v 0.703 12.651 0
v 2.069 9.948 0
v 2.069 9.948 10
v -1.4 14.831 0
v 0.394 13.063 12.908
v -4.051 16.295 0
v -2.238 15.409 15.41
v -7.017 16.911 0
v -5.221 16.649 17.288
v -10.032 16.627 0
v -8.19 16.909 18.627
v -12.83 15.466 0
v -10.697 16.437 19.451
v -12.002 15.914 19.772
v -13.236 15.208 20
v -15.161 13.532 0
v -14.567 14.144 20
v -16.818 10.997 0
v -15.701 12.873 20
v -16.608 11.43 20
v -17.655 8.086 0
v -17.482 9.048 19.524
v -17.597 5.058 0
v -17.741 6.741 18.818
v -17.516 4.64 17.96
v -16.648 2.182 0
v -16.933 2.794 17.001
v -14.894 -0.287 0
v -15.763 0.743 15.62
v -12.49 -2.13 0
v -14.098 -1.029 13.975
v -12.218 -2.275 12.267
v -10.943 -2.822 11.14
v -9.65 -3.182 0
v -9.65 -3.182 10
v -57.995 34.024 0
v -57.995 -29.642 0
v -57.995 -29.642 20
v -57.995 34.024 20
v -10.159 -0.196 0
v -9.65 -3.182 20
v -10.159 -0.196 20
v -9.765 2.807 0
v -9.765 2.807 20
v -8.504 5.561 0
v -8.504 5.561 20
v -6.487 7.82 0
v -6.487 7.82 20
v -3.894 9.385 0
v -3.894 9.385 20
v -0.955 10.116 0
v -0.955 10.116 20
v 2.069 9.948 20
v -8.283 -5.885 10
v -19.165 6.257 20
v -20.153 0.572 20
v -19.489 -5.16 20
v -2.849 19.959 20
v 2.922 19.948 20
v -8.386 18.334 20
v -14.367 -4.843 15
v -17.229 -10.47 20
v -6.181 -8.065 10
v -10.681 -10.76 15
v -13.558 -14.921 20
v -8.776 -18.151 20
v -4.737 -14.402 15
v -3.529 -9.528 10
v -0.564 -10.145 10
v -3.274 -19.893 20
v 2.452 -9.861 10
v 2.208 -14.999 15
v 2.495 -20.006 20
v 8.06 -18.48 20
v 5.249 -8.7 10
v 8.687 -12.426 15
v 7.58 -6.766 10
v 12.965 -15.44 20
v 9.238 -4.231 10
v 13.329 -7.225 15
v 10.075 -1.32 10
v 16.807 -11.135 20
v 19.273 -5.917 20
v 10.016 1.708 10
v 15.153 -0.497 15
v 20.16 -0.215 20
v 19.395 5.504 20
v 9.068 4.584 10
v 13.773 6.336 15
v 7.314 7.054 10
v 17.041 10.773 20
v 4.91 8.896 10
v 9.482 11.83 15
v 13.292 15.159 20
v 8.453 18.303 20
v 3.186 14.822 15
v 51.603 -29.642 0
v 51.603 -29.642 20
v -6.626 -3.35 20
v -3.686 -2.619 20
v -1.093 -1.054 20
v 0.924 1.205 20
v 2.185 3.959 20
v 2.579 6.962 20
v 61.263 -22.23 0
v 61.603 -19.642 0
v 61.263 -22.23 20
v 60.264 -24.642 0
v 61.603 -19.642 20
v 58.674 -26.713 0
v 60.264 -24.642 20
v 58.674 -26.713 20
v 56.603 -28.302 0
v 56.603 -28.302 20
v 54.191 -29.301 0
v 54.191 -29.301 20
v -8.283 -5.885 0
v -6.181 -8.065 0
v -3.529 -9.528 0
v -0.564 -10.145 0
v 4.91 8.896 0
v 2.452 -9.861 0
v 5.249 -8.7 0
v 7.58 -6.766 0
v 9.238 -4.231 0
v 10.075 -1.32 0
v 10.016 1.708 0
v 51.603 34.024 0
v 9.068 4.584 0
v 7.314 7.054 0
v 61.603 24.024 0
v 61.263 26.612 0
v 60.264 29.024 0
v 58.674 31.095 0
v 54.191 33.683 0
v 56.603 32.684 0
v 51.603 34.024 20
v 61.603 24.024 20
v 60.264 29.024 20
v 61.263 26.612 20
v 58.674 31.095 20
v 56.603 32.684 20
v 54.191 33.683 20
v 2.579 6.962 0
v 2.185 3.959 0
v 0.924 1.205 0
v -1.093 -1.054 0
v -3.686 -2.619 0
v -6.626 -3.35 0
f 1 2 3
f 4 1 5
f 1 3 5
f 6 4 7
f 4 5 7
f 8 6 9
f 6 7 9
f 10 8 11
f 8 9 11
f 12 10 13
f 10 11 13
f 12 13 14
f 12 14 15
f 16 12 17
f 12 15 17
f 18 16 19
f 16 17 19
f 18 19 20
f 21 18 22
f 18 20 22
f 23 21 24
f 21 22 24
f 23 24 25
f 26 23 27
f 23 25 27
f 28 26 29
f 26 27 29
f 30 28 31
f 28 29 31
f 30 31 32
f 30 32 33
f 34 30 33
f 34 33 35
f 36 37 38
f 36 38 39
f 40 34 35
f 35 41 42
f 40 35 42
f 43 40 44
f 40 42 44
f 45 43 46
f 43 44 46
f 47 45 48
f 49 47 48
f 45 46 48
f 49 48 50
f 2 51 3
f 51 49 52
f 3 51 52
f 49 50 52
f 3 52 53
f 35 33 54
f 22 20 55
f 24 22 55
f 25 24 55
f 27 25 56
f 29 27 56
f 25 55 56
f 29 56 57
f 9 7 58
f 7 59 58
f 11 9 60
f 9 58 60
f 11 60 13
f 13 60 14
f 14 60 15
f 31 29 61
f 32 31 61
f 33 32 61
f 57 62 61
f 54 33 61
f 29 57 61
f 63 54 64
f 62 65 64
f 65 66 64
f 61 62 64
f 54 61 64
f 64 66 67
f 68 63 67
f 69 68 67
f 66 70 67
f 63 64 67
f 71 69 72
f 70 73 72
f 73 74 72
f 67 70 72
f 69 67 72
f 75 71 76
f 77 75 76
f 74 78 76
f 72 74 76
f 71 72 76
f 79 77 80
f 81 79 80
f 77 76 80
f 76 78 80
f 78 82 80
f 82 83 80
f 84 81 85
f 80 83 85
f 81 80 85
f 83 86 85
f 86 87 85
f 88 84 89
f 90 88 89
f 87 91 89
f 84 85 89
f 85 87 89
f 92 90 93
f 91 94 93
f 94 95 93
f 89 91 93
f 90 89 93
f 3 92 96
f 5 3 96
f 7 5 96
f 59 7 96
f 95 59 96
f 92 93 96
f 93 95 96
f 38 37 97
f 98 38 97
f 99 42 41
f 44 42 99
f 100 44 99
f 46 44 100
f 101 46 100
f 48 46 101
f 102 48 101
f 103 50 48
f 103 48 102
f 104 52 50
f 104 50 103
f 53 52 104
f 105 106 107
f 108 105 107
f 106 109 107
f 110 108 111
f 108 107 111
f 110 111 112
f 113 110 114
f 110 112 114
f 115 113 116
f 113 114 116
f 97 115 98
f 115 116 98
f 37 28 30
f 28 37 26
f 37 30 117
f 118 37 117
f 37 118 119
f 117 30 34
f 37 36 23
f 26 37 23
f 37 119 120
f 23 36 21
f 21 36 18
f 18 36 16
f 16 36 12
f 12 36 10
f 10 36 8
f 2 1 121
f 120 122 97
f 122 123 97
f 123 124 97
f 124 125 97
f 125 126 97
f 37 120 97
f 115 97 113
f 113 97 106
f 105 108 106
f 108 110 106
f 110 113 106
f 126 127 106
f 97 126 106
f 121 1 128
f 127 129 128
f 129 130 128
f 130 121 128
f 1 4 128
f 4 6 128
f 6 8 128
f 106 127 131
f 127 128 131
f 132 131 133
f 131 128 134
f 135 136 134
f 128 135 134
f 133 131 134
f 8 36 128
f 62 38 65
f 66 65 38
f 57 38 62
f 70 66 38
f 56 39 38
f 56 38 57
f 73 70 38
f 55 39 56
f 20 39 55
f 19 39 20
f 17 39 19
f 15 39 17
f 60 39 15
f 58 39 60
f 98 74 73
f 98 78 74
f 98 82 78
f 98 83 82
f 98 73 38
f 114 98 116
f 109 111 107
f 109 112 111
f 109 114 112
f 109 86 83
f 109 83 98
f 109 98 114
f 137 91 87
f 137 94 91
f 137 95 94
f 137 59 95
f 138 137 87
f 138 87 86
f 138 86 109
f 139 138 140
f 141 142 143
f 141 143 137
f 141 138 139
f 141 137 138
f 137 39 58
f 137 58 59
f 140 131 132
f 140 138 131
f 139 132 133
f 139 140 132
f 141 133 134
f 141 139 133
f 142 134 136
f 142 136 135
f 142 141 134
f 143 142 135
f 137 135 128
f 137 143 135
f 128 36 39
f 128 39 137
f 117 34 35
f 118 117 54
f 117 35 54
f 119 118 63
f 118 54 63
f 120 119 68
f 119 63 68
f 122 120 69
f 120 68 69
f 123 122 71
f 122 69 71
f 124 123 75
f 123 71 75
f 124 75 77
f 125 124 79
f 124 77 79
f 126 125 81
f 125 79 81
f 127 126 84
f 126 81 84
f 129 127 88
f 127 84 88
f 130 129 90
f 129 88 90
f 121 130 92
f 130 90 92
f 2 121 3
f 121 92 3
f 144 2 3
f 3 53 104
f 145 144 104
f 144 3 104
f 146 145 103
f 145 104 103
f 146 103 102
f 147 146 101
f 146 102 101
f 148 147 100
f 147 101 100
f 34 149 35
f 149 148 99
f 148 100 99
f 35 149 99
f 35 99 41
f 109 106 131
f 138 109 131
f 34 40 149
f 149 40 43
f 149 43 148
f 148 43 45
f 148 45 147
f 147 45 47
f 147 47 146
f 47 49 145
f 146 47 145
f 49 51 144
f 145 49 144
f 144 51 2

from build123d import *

# Parameters (mm, degrees)
SKETCH1_W           = 119.597938106
SKETCH1_H           = 63.665281708
BOSS_EXTRUDE1_DEPTH = 20
FILLET1_R           = 10
FILLET2_R           = 10
CUT_EXTRUDE1_DEPTH  = 20
CHAMFER1_SIZE       = 10


with BuildPart() as part:
    # Sketch1 → Boss-Extrude1 (new body)
    with BuildSketch(Plane.XY):
        with Locations((1.804279239, 2.190910504)):
            Rectangle(SKETCH1_W, SKETCH1_H)
    extrude(amount=BOSS_EXTRUDE1_DEPTH)

    # Fillet1
    fillet1_edges = [part.edges().sort_by_distance(p)[0] for p in [
        (61.603248292, 34.023551358, 10),
    ]]
    fillet(fillet1_edges, radius=FILLET1_R)

    # Fillet2
    fillet2_edges = [part.edges().sort_by_distance(p)[0] for p in [
        (61.603248292, -29.64173035, 10),
    ]]
    fillet(fillet2_edges, radius=FILLET2_R)

    # Sketch2 → Cut-Extrude1 (cut)
    with BuildSketch(Plane.XY.offset(20)):
        with BuildLine():
            ThreePointArc((-9.649869077, -3.18172058), (7.580385389, -6.766171474), (2.069483688, 9.947892054))
            ThreePointArc((2.069483688, 9.947892054), (0, 0), (-9.649869077, -3.18172058))
        make_face()
        with BuildLine():
            ThreePointArc((-9.649869077, -3.18172058), (-7.580385389, 6.766171474), (2.069483688, 9.947892054))
            ThreePointArc((2.069483688, 9.947892054), (-15.160770777, 13.532342947), (-9.649869077, -3.18172058))
        make_face()
    extrude(amount=-CUT_EXTRUDE1_DEPTH, mode=Mode.SUBTRACT)

    # Chamfer1
    # the kernel refuses this chamfer: 10 mm, written as the material it takes off along each edge
    with BuildSketch(Plane(origin=(0, 0, 20), x_dir=(-0.7481252128924886, 0.6635575829078957, 0), z_dir=(0.6635575829078957, 0.7481252128924886, 0))) as chamfer1_piece_1:
        Polygon((10.160871963, -CHAMFER1_SIZE), (10.160871963 + CHAMFER1_SIZE, 0), (10.160871963, 0), align=None)
    revolve(axis=Axis((0, 0, 20), (0, 0, 1)), revolution_arc=359.64, mode=Mode.SUBTRACT)


solid = part.part
